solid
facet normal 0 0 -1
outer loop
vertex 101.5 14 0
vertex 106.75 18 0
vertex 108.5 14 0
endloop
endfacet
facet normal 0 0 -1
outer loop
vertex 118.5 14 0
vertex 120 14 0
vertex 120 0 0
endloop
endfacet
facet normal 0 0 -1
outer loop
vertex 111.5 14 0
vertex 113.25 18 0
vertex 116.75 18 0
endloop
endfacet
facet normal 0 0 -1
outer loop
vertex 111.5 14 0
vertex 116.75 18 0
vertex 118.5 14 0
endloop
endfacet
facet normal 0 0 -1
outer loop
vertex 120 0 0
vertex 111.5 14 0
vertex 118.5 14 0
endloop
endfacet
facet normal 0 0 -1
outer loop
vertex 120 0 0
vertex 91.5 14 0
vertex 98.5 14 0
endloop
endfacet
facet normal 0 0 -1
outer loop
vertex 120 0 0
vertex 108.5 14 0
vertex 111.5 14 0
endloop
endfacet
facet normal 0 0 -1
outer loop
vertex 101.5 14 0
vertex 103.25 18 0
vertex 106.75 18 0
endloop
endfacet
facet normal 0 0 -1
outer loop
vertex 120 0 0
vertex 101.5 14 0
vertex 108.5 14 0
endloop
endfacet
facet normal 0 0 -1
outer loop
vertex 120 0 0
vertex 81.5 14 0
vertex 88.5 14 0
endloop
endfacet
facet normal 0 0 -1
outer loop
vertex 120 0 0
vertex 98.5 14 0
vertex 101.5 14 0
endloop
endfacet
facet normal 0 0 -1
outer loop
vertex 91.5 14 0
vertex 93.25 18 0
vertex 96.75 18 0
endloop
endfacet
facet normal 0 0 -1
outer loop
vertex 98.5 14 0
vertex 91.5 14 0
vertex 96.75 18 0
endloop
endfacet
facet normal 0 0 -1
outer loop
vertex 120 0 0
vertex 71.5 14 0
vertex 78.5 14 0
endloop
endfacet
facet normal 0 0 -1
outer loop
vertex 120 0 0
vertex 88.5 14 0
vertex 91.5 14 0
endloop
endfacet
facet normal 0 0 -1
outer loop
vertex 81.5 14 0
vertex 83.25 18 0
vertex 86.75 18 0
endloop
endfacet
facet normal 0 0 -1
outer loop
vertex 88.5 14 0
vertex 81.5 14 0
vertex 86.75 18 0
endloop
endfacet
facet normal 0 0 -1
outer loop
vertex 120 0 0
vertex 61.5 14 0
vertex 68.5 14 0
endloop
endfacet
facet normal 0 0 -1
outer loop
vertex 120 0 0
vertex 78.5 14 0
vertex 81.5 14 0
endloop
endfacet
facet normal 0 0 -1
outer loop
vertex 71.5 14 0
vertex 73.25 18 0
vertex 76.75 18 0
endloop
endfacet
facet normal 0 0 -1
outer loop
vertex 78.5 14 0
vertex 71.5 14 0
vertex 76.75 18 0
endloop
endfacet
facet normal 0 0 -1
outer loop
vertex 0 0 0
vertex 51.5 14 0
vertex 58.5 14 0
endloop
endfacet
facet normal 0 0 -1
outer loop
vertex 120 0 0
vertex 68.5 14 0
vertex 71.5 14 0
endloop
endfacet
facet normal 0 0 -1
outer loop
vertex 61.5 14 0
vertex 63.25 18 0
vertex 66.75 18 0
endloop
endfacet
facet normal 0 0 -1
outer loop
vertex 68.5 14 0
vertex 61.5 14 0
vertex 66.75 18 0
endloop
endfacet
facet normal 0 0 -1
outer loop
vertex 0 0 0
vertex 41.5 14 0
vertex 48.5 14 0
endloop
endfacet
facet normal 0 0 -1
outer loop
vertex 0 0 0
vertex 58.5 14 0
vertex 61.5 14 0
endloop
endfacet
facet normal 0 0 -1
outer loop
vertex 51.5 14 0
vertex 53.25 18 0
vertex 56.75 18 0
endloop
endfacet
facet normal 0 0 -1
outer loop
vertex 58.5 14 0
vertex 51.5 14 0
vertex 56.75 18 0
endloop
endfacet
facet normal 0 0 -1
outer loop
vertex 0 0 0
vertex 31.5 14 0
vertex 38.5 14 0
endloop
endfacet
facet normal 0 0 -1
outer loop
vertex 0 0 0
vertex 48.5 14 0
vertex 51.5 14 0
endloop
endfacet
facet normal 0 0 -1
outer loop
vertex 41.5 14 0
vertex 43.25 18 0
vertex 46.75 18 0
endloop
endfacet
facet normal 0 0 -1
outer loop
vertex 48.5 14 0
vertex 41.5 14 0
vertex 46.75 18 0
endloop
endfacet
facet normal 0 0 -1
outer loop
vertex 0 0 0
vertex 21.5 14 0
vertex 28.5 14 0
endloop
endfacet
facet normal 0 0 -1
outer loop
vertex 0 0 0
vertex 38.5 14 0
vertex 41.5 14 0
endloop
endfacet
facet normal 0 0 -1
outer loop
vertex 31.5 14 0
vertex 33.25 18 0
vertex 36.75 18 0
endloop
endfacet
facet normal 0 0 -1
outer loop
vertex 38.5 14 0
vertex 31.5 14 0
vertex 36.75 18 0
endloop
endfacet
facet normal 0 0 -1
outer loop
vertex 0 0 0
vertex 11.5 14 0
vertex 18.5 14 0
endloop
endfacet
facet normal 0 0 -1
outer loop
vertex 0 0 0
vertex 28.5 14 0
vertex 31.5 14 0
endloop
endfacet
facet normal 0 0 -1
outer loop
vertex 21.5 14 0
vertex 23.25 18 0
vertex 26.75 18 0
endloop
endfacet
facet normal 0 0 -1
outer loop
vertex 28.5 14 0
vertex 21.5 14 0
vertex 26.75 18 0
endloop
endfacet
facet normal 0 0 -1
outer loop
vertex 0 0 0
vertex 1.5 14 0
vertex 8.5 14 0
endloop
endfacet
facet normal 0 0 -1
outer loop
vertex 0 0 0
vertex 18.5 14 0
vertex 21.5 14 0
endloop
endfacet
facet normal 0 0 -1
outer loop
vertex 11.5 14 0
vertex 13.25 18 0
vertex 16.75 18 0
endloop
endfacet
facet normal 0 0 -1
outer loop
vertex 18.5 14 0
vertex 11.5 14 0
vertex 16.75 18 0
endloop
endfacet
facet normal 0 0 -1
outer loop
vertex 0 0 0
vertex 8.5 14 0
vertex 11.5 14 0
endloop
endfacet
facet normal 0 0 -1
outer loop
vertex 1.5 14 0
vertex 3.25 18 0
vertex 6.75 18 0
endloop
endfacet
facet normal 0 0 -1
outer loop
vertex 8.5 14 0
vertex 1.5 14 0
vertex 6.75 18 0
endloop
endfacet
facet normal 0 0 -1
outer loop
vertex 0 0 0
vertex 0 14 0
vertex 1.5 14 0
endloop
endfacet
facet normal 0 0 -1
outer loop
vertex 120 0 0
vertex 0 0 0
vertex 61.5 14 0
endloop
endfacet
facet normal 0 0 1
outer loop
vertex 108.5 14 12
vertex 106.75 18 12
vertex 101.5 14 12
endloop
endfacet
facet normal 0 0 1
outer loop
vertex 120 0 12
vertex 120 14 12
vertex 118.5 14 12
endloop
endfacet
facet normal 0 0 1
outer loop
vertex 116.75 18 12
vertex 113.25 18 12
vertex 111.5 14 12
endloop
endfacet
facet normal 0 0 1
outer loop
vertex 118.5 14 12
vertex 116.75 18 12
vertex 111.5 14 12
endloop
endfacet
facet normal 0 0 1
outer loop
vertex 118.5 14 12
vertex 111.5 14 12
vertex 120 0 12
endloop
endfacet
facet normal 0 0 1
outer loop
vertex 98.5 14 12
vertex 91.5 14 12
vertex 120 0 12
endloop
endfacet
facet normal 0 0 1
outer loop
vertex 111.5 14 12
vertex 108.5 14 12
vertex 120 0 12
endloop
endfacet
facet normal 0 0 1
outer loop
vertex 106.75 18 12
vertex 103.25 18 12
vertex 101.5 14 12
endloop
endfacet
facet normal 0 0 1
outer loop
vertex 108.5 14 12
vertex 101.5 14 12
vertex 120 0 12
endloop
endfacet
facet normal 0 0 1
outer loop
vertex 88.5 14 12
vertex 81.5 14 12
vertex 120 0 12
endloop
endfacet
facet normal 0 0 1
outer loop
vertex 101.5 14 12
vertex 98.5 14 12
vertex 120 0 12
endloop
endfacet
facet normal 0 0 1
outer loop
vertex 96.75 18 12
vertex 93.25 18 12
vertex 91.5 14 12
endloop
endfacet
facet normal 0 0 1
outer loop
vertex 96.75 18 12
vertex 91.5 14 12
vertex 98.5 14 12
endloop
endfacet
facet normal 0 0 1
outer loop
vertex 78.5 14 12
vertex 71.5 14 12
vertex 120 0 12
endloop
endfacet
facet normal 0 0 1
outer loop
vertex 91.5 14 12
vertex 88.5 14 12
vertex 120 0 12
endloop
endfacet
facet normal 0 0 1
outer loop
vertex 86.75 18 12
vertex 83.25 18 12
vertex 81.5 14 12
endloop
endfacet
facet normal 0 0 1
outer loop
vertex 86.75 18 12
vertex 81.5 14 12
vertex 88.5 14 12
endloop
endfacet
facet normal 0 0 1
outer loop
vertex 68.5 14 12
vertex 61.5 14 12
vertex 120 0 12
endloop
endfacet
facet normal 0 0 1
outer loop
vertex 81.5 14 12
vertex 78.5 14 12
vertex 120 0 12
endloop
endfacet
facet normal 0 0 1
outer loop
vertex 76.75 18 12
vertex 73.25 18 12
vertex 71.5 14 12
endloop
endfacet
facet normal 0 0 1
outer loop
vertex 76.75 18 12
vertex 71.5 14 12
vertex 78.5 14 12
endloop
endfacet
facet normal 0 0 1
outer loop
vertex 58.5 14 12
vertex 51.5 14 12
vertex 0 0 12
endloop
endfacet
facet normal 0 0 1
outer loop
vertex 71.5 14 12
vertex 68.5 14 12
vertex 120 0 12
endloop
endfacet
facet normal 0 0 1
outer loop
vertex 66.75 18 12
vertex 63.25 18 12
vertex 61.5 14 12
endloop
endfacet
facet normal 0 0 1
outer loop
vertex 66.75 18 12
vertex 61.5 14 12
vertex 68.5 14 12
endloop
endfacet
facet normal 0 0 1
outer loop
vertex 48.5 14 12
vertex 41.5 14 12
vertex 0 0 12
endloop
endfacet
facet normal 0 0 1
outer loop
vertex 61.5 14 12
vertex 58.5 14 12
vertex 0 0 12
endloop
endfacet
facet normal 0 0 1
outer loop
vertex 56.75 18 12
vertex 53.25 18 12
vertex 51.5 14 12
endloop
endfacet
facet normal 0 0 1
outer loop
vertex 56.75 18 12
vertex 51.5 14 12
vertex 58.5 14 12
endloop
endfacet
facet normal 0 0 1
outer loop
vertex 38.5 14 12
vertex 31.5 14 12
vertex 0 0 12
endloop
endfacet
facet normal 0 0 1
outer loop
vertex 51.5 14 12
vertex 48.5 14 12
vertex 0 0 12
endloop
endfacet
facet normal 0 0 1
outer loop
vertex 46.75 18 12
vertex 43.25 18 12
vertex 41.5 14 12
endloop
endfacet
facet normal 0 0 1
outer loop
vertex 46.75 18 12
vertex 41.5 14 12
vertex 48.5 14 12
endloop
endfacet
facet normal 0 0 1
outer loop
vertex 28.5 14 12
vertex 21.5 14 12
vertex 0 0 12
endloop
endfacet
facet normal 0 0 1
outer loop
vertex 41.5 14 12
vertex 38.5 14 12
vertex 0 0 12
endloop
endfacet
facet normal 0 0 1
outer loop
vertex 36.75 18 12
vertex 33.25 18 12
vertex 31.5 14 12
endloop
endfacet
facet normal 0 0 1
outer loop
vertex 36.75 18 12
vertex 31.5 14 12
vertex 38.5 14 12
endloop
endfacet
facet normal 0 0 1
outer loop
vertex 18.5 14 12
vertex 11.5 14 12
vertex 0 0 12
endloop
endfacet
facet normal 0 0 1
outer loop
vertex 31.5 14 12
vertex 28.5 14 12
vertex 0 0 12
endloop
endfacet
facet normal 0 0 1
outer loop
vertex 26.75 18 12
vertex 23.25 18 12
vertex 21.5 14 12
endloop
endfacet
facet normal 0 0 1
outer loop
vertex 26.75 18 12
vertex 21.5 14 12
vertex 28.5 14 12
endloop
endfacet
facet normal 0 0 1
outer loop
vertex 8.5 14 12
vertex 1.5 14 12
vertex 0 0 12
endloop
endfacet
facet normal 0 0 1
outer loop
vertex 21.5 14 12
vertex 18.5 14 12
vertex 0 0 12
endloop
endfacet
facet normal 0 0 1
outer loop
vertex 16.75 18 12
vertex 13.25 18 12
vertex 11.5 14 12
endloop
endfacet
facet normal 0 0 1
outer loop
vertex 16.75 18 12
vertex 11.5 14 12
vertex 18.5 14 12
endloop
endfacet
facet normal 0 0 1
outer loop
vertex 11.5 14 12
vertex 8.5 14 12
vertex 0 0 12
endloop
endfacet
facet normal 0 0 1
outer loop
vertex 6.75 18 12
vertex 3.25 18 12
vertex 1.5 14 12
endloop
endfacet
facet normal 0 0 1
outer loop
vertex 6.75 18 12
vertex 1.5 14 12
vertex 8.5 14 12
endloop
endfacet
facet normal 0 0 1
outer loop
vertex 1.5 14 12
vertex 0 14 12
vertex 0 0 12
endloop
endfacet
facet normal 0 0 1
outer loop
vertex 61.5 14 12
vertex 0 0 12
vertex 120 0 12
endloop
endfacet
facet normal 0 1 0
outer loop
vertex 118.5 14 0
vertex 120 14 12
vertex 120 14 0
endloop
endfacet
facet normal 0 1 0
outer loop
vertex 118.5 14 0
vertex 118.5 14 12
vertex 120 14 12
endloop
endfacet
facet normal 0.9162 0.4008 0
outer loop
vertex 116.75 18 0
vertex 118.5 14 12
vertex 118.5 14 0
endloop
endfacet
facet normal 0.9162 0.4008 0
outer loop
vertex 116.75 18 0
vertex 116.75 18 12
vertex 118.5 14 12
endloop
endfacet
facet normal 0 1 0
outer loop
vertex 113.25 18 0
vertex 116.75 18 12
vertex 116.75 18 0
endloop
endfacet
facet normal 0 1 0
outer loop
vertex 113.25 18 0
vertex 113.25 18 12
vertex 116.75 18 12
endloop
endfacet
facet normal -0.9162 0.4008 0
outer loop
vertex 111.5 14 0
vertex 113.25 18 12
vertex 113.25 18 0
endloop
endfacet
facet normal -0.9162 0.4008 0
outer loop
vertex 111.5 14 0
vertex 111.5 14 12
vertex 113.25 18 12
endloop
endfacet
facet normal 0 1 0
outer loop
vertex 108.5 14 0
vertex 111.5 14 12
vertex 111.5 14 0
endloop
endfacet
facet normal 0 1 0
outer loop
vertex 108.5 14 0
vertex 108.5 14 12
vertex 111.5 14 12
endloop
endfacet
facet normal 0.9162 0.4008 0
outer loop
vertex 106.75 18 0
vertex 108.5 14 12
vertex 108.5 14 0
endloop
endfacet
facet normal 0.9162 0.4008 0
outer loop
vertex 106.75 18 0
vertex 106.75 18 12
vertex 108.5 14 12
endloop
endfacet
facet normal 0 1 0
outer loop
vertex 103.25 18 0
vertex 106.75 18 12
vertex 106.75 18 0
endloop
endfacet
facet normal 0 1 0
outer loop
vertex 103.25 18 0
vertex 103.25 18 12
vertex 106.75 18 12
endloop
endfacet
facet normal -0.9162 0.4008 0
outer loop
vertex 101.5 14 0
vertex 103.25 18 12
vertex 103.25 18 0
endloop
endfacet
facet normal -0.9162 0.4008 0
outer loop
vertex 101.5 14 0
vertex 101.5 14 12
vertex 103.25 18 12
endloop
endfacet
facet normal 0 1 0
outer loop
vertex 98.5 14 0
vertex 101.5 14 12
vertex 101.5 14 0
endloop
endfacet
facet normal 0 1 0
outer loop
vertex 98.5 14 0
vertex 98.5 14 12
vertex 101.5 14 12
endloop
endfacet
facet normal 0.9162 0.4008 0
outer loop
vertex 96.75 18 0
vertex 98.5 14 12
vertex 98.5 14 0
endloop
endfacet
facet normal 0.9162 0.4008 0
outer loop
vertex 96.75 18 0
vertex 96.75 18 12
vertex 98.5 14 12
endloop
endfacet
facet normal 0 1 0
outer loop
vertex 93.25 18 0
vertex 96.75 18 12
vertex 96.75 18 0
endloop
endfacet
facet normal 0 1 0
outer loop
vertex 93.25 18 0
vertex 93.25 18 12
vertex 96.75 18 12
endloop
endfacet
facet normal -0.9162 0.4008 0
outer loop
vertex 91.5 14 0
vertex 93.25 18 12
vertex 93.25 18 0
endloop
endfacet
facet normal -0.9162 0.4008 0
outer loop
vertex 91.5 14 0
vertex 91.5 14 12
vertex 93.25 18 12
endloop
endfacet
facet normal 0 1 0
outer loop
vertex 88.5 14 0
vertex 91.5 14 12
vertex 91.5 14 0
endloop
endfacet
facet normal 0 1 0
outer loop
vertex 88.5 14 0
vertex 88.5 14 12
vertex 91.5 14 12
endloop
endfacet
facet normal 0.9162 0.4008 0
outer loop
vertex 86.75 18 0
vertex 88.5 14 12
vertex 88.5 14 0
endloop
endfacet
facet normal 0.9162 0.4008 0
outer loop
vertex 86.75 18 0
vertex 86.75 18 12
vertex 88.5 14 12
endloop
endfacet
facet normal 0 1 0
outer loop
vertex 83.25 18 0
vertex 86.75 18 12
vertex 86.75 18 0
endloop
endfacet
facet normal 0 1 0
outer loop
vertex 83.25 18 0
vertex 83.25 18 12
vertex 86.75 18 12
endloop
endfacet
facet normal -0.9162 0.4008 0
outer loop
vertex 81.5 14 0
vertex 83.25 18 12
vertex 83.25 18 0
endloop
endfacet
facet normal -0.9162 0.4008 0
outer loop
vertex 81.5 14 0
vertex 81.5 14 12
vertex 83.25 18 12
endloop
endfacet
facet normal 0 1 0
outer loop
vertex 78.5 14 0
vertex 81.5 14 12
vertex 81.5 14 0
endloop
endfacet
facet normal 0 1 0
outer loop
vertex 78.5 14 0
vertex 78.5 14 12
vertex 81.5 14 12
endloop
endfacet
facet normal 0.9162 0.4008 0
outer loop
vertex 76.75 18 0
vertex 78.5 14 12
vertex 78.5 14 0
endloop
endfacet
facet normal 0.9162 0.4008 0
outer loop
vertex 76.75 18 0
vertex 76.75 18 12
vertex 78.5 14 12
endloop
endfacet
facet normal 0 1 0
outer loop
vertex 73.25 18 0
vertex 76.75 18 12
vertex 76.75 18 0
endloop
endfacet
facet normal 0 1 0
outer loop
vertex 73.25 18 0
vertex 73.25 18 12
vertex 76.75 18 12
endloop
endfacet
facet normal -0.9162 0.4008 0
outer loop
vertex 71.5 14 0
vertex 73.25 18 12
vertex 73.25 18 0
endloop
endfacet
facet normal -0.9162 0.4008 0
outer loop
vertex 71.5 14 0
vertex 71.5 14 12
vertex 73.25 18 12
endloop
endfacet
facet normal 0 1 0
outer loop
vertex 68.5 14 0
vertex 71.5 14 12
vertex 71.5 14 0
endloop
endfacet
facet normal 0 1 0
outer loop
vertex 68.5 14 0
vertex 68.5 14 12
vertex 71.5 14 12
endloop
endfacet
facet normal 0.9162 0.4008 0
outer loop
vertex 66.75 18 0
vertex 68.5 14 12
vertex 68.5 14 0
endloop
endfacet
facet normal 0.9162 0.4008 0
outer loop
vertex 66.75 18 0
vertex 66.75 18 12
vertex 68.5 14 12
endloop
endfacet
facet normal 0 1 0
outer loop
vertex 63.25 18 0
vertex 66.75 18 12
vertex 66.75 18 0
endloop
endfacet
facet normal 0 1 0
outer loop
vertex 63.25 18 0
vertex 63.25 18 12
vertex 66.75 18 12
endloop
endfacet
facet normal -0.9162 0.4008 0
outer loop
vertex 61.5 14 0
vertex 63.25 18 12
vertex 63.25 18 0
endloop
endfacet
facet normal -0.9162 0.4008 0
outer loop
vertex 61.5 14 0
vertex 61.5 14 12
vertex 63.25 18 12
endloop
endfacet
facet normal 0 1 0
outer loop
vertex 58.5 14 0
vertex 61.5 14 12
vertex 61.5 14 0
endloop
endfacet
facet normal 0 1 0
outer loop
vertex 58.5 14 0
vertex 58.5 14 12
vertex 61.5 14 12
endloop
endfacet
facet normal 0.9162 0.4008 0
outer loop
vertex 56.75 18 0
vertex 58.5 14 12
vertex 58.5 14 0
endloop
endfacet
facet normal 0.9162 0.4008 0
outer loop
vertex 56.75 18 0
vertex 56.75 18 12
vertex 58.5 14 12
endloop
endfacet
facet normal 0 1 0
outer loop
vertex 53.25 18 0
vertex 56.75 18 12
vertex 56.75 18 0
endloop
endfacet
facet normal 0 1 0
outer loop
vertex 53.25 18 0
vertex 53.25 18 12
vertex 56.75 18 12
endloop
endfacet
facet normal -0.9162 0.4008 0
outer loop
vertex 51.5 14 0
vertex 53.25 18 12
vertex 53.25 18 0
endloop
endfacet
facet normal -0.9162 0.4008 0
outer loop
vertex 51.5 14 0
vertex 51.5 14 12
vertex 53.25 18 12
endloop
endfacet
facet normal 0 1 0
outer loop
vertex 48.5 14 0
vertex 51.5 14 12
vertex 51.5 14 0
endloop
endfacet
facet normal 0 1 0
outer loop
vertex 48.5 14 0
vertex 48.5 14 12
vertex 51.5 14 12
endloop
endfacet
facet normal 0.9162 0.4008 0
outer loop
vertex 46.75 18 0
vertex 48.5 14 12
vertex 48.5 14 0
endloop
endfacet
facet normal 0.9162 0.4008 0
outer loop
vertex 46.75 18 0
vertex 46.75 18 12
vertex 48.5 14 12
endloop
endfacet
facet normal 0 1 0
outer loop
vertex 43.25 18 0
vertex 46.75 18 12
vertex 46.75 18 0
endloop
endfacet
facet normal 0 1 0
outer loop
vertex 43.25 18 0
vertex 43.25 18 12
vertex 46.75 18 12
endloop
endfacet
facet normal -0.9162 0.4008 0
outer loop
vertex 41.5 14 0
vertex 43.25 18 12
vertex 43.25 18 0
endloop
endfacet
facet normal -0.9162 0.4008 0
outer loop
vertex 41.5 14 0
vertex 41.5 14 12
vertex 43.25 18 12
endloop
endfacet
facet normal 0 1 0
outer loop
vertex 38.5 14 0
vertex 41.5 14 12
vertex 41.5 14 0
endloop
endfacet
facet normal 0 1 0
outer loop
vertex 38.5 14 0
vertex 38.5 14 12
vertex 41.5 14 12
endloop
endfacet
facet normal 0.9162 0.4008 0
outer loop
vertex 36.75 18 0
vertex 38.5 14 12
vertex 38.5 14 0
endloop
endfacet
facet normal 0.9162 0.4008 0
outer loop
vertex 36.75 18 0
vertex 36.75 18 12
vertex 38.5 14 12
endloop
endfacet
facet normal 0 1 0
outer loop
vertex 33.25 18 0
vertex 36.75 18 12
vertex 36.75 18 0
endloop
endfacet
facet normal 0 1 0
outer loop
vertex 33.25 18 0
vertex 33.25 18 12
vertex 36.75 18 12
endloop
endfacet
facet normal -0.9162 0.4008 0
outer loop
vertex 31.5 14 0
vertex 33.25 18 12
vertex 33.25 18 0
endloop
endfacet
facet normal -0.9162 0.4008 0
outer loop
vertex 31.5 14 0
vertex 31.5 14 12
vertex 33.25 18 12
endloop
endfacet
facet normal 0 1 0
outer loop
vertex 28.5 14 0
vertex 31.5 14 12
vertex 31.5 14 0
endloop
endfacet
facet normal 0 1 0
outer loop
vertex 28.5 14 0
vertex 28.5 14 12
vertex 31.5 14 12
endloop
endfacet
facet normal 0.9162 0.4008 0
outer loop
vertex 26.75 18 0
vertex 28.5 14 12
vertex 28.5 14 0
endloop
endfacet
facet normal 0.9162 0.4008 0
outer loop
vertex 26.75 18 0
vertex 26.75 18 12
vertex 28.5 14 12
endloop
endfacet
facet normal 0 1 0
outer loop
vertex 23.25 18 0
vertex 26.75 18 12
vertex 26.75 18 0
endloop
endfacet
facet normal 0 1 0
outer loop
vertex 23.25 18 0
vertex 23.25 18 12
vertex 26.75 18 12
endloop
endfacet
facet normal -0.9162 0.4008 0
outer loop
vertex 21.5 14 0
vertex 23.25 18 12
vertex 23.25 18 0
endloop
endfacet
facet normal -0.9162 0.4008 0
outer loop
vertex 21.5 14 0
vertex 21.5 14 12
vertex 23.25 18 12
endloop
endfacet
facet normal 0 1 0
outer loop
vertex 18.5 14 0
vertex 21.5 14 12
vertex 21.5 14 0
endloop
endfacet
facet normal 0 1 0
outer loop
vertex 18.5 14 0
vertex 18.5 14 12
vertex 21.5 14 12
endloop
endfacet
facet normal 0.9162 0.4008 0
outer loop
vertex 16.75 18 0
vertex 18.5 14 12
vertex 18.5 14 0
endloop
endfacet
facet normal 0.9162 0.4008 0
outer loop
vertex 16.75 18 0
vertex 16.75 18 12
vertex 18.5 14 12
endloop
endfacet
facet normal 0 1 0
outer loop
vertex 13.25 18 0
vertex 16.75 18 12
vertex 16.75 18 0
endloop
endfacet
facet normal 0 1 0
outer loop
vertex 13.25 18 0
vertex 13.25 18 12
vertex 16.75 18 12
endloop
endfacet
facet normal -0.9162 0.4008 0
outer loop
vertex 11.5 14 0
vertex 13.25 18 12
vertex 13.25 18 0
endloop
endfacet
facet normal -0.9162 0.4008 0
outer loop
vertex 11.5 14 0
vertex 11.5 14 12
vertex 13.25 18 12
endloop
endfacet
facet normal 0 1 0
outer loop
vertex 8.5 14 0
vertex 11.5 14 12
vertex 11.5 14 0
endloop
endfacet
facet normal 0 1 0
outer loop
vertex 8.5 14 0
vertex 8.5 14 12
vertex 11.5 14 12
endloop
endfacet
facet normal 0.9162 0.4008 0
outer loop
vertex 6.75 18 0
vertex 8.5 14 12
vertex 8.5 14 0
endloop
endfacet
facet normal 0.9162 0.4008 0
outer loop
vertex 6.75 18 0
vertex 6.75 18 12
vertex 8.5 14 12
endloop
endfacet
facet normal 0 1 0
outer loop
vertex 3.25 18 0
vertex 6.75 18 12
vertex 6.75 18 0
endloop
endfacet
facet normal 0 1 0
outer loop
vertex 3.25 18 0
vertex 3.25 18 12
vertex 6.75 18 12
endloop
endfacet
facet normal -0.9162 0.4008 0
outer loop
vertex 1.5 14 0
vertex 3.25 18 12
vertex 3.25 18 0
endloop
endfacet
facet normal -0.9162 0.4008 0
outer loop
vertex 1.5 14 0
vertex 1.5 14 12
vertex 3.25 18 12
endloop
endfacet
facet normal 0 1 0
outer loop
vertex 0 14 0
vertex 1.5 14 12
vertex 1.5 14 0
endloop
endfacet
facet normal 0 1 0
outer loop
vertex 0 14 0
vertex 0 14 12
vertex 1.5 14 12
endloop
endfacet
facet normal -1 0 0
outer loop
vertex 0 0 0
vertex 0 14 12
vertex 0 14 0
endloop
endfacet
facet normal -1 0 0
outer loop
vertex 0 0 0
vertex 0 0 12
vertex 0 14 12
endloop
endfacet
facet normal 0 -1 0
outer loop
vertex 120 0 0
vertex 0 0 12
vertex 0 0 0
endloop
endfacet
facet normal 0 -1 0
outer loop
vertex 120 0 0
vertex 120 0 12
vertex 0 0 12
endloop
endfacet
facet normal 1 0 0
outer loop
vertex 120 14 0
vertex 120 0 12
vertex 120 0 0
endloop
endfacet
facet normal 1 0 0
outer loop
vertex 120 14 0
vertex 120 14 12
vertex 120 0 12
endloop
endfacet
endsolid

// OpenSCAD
$fn = 32;

// ----------------------------------------------------------------------
// Gear rack: 12 teeth, pitch 10 mm
// ----------------------------------------------------------------------

// --- parameters (mm) ---
teeth = 12;               // number of teeth
pitch = 10;               // tooth pitch, X
root_w = 7;               // tooth width at the root
tip_w = 3.5;              // tooth width at the tip
base_h = 14;              // rack body height, Y
tooth_h = 4;              // tooth height above the body
plate_t = 12;             // rack width, Z (extrusion height)

rack_l = teeth * pitch;  // overall length
total_h = base_h + tooth_h;  // overall height

profile = [[0, 0], [120, 0], [120, 14], [118.5, 14], [116.75, 18], [113.25, 18], [111.5, 14], [108.5, 14], [106.75, 18], [103.25, 18], [101.5, 14], [98.5, 14], [96.75, 18], [93.25, 18], [91.5, 14], [88.5, 14], [86.75, 18], [83.25, 18], [81.5, 14], [78.5, 14], [76.75, 18], [73.25, 18], [71.5, 14], [68.5, 14], [66.75, 18], [63.25, 18], [61.5, 14], [58.5, 14], [56.75, 18], [53.25, 18], [51.5, 14], [48.5, 14], [46.75, 18], [43.25, 18], [41.5, 14], [38.5, 14], [36.75, 18], [33.25, 18], [31.5, 14], [28.5, 14], [26.75, 18], [23.25, 18], [21.5, 14], [18.5, 14], [16.75, 18], [13.25, 18], [11.5, 14], [8.5, 14], [6.75, 18], [3.25, 18], [1.5, 14], [0, 14]];  // primary outline, 52 points, counter clockwise

// --- the one profile operation ---
linear_extrude(height = plate_t) polygon(points = profile);
